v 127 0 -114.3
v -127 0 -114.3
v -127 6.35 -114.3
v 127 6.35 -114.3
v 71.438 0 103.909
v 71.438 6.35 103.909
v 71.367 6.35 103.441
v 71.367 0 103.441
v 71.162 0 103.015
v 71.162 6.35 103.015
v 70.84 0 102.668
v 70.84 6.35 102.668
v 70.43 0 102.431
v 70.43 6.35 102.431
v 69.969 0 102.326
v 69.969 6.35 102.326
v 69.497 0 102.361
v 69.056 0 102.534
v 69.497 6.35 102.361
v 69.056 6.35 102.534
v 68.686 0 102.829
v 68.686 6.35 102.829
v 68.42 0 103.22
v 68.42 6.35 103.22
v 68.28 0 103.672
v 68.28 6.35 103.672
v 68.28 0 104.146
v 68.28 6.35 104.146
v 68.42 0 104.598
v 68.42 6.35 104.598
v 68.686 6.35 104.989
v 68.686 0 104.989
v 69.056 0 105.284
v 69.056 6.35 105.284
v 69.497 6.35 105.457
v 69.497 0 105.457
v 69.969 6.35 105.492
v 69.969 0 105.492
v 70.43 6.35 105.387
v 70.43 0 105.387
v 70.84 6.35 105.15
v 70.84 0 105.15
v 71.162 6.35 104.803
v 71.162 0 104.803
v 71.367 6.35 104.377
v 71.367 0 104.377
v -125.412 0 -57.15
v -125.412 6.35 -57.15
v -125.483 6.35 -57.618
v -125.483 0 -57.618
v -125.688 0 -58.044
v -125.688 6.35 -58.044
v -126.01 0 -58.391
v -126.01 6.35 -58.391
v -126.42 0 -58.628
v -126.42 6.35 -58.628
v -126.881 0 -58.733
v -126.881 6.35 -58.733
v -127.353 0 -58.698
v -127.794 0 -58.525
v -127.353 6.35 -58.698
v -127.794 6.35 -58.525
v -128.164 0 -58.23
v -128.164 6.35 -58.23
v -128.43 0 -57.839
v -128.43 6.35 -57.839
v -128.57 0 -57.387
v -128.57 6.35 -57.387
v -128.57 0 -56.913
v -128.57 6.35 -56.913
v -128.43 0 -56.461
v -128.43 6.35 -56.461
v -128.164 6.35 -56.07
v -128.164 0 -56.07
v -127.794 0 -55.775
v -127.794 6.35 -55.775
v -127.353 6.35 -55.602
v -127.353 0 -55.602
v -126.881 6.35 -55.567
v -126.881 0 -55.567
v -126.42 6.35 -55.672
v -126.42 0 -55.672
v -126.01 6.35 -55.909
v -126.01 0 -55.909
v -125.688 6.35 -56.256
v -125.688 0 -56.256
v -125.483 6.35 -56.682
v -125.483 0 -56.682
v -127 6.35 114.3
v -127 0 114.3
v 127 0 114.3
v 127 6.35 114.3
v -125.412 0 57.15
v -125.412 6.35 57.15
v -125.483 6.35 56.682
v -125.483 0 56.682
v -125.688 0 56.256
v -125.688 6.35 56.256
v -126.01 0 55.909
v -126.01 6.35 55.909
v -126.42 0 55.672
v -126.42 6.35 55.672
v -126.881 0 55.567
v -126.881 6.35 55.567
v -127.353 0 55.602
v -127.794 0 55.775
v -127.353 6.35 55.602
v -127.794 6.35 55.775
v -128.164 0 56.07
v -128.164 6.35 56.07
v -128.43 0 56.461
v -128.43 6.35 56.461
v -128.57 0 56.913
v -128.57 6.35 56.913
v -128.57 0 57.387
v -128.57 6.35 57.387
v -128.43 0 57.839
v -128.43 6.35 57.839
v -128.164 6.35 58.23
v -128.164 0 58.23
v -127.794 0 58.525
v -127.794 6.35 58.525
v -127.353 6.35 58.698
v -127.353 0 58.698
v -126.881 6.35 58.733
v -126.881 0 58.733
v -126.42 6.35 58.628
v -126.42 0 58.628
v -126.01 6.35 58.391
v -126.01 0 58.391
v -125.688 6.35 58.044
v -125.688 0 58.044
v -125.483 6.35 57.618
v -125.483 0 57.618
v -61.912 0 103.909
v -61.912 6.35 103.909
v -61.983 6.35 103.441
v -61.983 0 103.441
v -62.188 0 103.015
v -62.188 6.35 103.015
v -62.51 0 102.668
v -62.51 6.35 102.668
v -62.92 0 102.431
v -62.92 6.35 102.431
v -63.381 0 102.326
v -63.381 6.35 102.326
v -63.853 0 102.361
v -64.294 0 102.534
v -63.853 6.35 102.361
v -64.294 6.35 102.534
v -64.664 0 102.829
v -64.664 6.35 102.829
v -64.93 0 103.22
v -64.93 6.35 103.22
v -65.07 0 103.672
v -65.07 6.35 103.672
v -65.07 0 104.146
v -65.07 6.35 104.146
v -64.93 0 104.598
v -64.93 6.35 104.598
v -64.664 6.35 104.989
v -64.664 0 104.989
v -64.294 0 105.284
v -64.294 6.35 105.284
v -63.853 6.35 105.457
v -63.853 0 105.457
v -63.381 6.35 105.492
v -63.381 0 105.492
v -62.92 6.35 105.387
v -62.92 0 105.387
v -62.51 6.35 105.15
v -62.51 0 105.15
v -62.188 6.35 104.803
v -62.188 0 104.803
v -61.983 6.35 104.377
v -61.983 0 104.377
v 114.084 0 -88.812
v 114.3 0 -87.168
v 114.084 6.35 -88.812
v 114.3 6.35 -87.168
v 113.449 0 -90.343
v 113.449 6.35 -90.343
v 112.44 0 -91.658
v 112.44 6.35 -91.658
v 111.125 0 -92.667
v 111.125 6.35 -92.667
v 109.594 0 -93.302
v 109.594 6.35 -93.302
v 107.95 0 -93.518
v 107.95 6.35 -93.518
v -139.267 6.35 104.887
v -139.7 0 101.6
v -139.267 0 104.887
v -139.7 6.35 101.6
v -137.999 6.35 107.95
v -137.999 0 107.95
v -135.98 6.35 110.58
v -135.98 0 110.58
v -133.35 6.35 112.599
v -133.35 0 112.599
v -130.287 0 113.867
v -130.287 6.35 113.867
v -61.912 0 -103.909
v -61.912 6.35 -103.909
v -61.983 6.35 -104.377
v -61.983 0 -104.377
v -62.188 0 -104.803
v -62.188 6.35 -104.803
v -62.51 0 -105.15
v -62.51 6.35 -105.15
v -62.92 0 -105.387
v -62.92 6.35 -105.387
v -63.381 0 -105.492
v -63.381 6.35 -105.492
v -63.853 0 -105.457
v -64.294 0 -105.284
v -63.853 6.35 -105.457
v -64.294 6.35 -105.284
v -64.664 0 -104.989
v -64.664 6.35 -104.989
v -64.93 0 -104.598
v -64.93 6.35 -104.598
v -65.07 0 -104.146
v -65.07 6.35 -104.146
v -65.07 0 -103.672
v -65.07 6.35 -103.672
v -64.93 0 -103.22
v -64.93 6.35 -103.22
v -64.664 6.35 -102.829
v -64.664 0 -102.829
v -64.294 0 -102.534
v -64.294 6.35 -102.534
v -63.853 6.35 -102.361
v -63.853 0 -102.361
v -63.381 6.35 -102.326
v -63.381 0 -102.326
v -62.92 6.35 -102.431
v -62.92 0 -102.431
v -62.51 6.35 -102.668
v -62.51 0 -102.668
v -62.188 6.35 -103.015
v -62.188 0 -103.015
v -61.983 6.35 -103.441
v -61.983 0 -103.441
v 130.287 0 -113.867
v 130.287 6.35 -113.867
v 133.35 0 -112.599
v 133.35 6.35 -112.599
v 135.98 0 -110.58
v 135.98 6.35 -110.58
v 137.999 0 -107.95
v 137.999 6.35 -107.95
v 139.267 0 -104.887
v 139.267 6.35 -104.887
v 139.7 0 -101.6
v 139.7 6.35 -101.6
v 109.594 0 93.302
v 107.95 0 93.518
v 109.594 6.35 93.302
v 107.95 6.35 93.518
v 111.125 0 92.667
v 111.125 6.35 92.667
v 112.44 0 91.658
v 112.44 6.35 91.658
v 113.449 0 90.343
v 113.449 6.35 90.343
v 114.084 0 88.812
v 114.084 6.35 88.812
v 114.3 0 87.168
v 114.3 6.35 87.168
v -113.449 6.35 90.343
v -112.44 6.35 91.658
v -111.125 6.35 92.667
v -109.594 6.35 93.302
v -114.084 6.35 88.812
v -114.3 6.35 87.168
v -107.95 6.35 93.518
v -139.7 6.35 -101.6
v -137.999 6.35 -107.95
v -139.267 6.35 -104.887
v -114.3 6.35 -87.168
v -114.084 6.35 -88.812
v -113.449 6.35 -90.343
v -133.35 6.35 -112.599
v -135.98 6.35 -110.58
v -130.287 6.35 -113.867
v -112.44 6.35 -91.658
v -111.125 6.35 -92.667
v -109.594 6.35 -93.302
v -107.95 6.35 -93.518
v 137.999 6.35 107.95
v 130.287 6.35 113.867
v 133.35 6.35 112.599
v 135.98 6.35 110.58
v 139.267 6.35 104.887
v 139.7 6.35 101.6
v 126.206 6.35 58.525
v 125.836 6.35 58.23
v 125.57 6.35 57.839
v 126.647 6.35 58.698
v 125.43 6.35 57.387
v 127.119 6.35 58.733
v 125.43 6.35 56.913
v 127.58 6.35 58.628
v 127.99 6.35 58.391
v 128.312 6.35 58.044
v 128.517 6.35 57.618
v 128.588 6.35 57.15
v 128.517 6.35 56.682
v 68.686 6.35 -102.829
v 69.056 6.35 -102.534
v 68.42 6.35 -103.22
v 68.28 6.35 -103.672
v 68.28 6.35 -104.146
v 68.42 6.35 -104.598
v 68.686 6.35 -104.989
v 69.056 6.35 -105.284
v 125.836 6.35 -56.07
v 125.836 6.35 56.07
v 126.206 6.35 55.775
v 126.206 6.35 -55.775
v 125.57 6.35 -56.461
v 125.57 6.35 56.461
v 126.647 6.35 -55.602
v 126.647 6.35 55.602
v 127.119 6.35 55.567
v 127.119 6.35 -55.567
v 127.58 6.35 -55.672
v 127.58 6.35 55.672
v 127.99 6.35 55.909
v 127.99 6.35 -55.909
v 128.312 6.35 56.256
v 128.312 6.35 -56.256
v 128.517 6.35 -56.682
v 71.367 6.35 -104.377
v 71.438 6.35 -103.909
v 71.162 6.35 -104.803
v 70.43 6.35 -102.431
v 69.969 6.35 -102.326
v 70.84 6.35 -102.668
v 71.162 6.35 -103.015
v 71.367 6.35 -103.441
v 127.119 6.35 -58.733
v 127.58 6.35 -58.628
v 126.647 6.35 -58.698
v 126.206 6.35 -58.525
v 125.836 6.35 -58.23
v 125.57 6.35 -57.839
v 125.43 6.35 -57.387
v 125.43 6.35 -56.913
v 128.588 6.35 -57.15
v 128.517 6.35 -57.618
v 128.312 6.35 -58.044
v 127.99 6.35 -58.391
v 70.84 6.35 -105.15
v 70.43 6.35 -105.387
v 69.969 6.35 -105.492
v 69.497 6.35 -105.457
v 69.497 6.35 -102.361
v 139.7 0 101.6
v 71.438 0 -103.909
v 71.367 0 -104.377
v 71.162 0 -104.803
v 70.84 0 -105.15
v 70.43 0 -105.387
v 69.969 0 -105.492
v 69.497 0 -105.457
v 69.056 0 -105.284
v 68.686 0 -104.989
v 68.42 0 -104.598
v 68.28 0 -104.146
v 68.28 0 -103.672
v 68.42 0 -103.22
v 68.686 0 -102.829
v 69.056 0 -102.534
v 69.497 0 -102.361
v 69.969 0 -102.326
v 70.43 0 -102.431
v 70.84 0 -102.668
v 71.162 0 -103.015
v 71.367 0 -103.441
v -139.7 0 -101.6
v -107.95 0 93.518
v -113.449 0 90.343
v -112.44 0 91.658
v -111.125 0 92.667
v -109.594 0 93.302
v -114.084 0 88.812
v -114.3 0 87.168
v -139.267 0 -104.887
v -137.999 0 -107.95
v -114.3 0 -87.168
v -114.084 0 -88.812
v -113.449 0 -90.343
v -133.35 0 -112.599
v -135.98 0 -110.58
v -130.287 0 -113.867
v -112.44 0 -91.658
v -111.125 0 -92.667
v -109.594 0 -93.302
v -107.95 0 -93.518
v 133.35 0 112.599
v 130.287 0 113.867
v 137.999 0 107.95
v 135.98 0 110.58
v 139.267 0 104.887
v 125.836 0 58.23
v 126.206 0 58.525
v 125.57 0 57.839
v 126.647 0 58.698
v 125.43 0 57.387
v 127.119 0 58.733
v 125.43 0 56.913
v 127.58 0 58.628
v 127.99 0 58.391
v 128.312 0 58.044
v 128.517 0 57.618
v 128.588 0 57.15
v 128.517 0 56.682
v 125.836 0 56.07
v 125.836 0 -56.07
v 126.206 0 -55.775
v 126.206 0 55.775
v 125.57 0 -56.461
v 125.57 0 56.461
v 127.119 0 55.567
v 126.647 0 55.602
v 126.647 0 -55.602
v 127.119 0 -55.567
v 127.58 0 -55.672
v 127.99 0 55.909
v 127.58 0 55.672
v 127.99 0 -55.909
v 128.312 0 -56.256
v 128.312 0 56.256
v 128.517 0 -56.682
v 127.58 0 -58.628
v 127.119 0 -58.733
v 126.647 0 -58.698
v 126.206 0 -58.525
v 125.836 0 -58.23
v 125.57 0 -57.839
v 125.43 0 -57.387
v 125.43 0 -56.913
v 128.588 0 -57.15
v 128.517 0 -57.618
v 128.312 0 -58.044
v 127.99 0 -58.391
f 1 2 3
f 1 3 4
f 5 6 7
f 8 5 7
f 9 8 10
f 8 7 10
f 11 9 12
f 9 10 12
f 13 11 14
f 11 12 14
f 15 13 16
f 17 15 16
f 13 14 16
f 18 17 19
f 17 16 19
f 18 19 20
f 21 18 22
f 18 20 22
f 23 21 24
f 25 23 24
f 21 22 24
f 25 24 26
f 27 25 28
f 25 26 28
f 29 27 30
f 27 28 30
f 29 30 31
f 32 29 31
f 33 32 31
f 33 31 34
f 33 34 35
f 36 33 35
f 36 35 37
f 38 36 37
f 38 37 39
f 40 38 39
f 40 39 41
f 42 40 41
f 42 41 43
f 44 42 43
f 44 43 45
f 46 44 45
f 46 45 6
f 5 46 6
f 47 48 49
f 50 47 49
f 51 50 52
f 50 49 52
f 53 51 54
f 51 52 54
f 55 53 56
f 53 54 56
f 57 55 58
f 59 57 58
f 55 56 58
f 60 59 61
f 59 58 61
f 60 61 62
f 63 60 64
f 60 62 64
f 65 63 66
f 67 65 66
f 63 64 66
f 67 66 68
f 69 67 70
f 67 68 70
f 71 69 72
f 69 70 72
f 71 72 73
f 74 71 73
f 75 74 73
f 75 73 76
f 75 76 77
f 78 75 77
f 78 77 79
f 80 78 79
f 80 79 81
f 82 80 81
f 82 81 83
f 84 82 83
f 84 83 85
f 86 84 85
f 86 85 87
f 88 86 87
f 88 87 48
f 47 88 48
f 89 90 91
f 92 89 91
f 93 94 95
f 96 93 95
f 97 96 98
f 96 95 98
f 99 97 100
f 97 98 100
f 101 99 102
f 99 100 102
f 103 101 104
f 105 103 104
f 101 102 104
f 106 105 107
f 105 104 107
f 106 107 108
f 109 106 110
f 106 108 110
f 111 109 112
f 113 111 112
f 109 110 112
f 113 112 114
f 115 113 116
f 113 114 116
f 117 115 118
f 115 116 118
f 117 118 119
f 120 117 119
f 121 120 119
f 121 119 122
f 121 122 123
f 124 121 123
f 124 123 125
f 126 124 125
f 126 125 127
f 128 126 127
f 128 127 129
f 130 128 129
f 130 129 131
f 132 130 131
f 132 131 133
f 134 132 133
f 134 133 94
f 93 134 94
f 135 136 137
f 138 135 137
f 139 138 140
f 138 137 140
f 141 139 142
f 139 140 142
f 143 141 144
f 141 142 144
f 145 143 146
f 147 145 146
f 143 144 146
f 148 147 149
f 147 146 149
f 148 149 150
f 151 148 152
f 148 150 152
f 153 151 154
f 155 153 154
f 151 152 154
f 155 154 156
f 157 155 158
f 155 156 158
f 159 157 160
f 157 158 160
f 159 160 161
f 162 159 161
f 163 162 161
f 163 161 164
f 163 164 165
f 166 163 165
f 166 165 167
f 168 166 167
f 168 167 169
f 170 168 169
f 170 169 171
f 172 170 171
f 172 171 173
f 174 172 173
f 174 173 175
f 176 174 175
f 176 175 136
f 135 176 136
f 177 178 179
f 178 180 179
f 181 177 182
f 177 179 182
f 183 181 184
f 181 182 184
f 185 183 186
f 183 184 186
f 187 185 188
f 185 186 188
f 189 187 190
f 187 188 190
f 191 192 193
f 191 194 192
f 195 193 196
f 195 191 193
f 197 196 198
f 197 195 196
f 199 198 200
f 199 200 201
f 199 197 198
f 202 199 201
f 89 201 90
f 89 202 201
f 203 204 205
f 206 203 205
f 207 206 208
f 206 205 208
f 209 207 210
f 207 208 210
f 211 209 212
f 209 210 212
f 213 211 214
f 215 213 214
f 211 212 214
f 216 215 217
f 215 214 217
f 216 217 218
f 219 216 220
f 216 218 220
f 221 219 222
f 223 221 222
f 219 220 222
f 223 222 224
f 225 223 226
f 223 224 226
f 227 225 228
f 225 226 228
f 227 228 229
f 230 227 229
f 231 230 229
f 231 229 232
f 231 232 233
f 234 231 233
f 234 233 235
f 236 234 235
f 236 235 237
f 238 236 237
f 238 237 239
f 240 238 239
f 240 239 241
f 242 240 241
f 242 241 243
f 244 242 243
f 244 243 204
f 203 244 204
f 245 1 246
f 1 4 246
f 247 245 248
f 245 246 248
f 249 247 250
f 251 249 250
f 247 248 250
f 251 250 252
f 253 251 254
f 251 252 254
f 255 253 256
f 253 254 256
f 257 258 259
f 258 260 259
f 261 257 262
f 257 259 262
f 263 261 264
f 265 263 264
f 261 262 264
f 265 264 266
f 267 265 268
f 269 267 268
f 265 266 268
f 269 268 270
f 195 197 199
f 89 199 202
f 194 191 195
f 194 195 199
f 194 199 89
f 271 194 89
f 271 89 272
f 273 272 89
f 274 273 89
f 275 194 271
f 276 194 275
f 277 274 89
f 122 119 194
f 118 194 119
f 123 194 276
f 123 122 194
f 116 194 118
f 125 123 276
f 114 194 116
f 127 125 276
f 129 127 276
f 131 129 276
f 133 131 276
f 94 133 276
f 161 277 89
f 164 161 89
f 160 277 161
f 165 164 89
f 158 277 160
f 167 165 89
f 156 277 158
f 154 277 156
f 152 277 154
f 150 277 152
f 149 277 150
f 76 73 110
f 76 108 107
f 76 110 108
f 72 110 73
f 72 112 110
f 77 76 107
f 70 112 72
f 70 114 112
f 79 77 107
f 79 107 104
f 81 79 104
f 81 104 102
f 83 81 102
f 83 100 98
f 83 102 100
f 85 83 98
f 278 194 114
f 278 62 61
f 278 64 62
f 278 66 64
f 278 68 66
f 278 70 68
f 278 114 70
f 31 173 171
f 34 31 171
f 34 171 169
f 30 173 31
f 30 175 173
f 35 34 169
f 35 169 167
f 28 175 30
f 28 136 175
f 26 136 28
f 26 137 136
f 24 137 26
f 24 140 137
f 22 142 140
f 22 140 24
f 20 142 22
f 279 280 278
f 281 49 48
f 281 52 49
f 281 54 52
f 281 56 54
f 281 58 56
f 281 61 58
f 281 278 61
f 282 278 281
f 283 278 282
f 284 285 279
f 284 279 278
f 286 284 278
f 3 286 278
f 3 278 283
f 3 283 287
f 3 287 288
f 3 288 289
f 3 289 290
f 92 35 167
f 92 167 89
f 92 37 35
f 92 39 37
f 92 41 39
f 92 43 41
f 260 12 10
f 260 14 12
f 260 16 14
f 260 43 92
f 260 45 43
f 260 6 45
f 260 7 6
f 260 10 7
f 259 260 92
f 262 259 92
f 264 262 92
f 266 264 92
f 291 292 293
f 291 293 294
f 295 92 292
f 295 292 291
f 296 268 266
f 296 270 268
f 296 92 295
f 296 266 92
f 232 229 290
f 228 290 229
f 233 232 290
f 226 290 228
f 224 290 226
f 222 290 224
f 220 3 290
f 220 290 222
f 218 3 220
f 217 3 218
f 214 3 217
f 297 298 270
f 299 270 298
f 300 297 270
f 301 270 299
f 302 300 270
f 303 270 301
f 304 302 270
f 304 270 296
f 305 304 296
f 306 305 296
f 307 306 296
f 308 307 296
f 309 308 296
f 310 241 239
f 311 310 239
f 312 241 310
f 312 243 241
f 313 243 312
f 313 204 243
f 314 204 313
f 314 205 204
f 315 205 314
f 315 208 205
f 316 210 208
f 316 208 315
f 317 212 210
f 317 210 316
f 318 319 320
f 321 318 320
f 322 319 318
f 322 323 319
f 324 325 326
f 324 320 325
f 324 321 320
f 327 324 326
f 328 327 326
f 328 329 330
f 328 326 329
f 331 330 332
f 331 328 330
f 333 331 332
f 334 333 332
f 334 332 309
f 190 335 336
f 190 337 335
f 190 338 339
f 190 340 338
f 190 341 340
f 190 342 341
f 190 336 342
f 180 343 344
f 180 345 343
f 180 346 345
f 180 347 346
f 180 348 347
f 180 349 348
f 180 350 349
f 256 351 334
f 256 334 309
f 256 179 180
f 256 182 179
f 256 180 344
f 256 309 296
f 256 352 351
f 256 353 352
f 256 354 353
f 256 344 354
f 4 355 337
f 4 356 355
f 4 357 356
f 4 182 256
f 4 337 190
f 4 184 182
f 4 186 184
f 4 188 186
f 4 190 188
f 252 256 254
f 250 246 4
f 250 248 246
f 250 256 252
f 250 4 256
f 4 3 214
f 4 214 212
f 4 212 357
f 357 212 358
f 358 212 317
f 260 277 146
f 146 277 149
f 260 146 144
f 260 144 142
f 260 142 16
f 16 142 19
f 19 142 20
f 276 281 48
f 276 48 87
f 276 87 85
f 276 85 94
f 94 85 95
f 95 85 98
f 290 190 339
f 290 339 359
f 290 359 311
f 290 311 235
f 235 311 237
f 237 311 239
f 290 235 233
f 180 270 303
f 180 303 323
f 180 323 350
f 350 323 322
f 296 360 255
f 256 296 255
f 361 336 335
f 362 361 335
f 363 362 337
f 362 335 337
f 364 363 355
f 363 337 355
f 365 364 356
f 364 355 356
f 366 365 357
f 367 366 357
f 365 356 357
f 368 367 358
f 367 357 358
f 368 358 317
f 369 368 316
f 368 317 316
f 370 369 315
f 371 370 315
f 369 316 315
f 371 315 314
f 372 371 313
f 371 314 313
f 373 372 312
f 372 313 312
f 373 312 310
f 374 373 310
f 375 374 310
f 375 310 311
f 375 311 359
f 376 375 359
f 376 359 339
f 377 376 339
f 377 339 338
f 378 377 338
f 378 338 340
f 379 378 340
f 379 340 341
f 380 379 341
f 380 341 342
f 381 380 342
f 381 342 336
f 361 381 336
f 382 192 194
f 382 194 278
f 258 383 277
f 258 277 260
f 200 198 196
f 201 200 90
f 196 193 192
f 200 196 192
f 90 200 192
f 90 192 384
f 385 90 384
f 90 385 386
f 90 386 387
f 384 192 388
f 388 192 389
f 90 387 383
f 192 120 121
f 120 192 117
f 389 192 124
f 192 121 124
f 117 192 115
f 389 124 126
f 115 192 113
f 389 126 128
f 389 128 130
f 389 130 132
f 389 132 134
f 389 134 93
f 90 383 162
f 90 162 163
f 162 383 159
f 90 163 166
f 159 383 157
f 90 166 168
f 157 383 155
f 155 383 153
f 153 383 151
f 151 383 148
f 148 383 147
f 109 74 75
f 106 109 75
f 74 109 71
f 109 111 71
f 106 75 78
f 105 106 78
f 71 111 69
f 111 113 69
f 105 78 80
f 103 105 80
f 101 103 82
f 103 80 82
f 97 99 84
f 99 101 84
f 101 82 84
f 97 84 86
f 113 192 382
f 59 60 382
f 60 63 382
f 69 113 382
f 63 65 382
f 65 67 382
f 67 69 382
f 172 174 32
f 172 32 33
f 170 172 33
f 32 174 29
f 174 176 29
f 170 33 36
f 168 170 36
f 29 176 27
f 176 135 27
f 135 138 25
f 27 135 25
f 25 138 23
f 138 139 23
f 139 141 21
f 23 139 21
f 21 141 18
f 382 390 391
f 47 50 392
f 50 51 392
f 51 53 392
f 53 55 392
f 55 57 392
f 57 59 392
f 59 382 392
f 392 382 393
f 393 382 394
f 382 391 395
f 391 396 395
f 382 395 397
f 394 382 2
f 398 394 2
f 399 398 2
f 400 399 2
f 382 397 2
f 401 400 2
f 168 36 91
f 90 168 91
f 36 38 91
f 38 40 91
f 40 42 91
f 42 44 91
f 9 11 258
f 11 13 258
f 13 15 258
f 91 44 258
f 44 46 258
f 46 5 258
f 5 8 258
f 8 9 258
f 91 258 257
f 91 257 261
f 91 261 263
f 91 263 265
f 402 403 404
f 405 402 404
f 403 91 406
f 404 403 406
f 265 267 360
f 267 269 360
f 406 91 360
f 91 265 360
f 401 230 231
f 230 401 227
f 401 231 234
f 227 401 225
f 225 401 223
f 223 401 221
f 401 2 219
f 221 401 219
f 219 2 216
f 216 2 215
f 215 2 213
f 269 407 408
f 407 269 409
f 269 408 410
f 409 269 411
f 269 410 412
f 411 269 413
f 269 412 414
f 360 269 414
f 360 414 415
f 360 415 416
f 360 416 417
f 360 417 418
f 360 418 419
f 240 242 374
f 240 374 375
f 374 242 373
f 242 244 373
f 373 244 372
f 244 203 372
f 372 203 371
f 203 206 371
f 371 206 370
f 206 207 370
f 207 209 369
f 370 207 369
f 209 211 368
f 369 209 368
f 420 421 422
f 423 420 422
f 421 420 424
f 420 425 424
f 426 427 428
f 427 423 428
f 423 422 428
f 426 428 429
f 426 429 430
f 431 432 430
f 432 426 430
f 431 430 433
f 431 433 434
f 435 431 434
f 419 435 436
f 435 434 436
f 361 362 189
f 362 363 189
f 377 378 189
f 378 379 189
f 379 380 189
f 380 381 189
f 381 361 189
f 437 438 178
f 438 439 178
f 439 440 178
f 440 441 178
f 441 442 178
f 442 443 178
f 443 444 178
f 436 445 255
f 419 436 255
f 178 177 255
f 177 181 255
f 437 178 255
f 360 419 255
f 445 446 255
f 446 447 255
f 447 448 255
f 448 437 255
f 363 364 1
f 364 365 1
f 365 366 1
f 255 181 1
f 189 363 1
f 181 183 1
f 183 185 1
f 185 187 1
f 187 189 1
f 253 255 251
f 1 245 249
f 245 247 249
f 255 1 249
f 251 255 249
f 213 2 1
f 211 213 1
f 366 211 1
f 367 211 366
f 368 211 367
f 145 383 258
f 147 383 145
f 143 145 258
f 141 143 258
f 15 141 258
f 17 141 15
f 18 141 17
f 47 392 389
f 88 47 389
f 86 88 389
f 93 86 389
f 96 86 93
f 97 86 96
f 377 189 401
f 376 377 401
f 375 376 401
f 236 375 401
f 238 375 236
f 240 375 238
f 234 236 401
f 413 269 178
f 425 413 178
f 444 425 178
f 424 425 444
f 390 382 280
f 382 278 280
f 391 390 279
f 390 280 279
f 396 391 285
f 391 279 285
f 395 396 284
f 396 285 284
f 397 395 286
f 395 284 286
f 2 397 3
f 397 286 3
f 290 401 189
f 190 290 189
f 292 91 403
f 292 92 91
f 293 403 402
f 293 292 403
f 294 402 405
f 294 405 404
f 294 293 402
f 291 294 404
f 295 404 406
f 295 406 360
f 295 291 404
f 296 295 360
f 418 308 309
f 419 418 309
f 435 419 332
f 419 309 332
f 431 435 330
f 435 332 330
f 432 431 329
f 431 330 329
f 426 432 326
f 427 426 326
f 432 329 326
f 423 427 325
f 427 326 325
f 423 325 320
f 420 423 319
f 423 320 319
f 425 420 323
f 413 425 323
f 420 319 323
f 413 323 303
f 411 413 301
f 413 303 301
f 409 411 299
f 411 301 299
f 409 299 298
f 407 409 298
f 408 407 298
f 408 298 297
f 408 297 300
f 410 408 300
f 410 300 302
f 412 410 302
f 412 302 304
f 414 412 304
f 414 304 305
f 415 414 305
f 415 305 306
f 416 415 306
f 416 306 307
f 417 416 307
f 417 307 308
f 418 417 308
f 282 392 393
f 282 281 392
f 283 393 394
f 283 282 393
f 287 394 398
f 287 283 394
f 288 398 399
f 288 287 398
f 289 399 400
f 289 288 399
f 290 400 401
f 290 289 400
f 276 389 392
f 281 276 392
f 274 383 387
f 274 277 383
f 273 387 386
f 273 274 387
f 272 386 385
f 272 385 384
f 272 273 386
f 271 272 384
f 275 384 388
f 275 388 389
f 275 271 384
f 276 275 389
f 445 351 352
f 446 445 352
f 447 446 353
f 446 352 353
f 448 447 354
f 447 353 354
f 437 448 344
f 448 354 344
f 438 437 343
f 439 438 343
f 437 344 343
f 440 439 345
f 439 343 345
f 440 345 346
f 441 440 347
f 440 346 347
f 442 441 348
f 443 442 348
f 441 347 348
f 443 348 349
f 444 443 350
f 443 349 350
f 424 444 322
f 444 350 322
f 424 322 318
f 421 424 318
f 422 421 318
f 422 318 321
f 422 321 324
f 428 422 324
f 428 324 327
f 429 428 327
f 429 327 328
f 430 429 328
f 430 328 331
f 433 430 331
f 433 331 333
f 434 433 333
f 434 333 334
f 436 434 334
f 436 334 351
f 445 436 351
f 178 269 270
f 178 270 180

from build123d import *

# Parameters (mm, degrees)
SKETCH1_W           = 279.4
SKETCH1_H           = 228.6
SKETCH1_W_2         = 228.6
SKETCH1_H_2         = 187.036363636
BOSS_EXTRUDE1_DEPTH = 6.35
SKETCH2_R           = 1.5875
CUT_EXTRUDE1_DEPTH  = 7.35
FILLET1_R           = 12.7
FILLET2_R           = 6.35


with BuildPart() as part:
    # Sketch1 → Boss-Extrude1 (new body)
    with BuildSketch(Plane(origin=(0, 0, 0), x_dir=(1, 0, 0), z_dir=(0, 1, 0))):
        Rectangle(SKETCH1_W, SKETCH1_H)
        Rectangle(SKETCH1_W_2, SKETCH1_H_2, mode=Mode.SUBTRACT)
    extrude(amount=BOSS_EXTRUDE1_DEPTH)

    # Sketch2 → Cut-Extrude1 (cut, through all)
    with BuildSketch(Plane(origin=(0, 6.35, 0), x_dir=(1, 0, 0), z_dir=(0, 1, 0))):
        with Locations((-63.5, 103.909090909)):
            Circle(SKETCH2_R)
        with Locations((-63.5, -103.909090909)):
            Circle(SKETCH2_R)
        with Locations((69.85, 103.909090909)):
            Circle(SKETCH2_R)
        with Locations((69.85, -103.909090909)):
            Circle(SKETCH2_R)
        with Locations((-127, 57.15)):
            Circle(SKETCH2_R)
        with Locations((-127, -57.15)):
            Circle(SKETCH2_R)
        with Locations((127, 57.15)):
            Circle(SKETCH2_R)
        with Locations((127, -57.15)):
            Circle(SKETCH2_R)
    extrude(amount=-CUT_EXTRUDE1_DEPTH, mode=Mode.SUBTRACT)

    # Fillet1
    fillet1_edges = [part.edges().sort_by_distance(p)[0] for p in [
        (139.7, 3.175, 114.3),
        (-139.7, 3.175, 114.3),
        (-139.7, 3.175, -114.3),
        (139.7, 3.175, -114.3),
    ]]
    fillet(fillet1_edges, radius=FILLET1_R)

    # Fillet2
    fillet2_edges = [part.edges().sort_by_distance(p)[0] for p in [
        (114.3, 3.175, 93.518181818),
        (114.3, 3.175, -93.518181818),
        (-114.3, 3.175, -93.518181818),
        (-114.3, 3.175, 93.518181818),
    ]]
    fillet(fillet2_edges, radius=FILLET2_R)


solid = part.part
